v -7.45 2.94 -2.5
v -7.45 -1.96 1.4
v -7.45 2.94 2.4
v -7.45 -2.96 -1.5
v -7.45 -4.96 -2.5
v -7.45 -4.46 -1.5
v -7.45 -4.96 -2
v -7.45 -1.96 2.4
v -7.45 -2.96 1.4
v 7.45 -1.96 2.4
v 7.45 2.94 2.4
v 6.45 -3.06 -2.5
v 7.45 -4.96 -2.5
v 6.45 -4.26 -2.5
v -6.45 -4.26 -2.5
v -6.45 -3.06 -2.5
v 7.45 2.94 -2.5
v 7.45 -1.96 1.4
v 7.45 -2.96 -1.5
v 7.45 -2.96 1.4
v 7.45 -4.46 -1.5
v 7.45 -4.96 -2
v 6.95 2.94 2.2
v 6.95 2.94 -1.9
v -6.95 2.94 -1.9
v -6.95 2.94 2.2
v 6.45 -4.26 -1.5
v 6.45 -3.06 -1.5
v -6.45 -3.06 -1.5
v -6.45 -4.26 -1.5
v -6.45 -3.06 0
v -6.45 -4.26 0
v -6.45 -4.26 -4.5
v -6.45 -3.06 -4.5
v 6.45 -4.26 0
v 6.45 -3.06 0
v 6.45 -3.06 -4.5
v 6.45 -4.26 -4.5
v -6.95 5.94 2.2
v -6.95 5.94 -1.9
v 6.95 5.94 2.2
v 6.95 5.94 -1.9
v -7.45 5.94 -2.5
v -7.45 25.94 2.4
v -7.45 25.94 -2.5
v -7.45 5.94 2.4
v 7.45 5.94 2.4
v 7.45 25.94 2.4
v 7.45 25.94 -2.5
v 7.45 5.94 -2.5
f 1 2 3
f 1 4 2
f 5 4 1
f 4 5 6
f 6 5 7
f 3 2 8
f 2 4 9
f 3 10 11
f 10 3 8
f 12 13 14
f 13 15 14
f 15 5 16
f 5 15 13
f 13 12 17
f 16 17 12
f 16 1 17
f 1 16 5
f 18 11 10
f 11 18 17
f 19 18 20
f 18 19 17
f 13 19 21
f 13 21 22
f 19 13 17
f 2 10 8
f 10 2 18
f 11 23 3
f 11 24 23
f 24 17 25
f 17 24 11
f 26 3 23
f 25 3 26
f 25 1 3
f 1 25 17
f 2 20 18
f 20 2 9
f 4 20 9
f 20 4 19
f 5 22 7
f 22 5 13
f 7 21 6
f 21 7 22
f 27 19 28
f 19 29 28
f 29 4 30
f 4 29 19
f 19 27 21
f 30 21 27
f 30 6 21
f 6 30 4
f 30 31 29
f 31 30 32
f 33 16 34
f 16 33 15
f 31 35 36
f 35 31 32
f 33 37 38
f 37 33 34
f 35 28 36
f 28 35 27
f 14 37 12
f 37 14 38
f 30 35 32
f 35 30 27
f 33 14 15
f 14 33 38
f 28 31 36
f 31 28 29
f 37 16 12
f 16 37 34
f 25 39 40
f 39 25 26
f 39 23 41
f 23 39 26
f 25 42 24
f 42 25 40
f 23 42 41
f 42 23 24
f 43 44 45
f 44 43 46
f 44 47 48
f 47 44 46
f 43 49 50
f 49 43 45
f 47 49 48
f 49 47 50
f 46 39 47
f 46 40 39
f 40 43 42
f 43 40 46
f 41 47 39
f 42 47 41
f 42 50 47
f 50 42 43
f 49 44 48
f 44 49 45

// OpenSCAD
N=5;
A=2.4+N*2.5;
rotate([0,0,180])
translate([-A/2,-2.94,-2.5])
{
	cube([A,4.9,4.9]);
	cube([A,5.9,3.9]);
	hull()
	{
		cube([A,7.4,1]);
		cube([A,7.9,0.5]);
	}
	translate([1,6,-2])cube([A-2,1.2,4.5]); // Assumes cropped pins
	// Plug
	translate([0.5,-20,0.6])cube([A-1,21,4.1]);
	translate([0,-23,0])cube([A,20,4.9]);
}
